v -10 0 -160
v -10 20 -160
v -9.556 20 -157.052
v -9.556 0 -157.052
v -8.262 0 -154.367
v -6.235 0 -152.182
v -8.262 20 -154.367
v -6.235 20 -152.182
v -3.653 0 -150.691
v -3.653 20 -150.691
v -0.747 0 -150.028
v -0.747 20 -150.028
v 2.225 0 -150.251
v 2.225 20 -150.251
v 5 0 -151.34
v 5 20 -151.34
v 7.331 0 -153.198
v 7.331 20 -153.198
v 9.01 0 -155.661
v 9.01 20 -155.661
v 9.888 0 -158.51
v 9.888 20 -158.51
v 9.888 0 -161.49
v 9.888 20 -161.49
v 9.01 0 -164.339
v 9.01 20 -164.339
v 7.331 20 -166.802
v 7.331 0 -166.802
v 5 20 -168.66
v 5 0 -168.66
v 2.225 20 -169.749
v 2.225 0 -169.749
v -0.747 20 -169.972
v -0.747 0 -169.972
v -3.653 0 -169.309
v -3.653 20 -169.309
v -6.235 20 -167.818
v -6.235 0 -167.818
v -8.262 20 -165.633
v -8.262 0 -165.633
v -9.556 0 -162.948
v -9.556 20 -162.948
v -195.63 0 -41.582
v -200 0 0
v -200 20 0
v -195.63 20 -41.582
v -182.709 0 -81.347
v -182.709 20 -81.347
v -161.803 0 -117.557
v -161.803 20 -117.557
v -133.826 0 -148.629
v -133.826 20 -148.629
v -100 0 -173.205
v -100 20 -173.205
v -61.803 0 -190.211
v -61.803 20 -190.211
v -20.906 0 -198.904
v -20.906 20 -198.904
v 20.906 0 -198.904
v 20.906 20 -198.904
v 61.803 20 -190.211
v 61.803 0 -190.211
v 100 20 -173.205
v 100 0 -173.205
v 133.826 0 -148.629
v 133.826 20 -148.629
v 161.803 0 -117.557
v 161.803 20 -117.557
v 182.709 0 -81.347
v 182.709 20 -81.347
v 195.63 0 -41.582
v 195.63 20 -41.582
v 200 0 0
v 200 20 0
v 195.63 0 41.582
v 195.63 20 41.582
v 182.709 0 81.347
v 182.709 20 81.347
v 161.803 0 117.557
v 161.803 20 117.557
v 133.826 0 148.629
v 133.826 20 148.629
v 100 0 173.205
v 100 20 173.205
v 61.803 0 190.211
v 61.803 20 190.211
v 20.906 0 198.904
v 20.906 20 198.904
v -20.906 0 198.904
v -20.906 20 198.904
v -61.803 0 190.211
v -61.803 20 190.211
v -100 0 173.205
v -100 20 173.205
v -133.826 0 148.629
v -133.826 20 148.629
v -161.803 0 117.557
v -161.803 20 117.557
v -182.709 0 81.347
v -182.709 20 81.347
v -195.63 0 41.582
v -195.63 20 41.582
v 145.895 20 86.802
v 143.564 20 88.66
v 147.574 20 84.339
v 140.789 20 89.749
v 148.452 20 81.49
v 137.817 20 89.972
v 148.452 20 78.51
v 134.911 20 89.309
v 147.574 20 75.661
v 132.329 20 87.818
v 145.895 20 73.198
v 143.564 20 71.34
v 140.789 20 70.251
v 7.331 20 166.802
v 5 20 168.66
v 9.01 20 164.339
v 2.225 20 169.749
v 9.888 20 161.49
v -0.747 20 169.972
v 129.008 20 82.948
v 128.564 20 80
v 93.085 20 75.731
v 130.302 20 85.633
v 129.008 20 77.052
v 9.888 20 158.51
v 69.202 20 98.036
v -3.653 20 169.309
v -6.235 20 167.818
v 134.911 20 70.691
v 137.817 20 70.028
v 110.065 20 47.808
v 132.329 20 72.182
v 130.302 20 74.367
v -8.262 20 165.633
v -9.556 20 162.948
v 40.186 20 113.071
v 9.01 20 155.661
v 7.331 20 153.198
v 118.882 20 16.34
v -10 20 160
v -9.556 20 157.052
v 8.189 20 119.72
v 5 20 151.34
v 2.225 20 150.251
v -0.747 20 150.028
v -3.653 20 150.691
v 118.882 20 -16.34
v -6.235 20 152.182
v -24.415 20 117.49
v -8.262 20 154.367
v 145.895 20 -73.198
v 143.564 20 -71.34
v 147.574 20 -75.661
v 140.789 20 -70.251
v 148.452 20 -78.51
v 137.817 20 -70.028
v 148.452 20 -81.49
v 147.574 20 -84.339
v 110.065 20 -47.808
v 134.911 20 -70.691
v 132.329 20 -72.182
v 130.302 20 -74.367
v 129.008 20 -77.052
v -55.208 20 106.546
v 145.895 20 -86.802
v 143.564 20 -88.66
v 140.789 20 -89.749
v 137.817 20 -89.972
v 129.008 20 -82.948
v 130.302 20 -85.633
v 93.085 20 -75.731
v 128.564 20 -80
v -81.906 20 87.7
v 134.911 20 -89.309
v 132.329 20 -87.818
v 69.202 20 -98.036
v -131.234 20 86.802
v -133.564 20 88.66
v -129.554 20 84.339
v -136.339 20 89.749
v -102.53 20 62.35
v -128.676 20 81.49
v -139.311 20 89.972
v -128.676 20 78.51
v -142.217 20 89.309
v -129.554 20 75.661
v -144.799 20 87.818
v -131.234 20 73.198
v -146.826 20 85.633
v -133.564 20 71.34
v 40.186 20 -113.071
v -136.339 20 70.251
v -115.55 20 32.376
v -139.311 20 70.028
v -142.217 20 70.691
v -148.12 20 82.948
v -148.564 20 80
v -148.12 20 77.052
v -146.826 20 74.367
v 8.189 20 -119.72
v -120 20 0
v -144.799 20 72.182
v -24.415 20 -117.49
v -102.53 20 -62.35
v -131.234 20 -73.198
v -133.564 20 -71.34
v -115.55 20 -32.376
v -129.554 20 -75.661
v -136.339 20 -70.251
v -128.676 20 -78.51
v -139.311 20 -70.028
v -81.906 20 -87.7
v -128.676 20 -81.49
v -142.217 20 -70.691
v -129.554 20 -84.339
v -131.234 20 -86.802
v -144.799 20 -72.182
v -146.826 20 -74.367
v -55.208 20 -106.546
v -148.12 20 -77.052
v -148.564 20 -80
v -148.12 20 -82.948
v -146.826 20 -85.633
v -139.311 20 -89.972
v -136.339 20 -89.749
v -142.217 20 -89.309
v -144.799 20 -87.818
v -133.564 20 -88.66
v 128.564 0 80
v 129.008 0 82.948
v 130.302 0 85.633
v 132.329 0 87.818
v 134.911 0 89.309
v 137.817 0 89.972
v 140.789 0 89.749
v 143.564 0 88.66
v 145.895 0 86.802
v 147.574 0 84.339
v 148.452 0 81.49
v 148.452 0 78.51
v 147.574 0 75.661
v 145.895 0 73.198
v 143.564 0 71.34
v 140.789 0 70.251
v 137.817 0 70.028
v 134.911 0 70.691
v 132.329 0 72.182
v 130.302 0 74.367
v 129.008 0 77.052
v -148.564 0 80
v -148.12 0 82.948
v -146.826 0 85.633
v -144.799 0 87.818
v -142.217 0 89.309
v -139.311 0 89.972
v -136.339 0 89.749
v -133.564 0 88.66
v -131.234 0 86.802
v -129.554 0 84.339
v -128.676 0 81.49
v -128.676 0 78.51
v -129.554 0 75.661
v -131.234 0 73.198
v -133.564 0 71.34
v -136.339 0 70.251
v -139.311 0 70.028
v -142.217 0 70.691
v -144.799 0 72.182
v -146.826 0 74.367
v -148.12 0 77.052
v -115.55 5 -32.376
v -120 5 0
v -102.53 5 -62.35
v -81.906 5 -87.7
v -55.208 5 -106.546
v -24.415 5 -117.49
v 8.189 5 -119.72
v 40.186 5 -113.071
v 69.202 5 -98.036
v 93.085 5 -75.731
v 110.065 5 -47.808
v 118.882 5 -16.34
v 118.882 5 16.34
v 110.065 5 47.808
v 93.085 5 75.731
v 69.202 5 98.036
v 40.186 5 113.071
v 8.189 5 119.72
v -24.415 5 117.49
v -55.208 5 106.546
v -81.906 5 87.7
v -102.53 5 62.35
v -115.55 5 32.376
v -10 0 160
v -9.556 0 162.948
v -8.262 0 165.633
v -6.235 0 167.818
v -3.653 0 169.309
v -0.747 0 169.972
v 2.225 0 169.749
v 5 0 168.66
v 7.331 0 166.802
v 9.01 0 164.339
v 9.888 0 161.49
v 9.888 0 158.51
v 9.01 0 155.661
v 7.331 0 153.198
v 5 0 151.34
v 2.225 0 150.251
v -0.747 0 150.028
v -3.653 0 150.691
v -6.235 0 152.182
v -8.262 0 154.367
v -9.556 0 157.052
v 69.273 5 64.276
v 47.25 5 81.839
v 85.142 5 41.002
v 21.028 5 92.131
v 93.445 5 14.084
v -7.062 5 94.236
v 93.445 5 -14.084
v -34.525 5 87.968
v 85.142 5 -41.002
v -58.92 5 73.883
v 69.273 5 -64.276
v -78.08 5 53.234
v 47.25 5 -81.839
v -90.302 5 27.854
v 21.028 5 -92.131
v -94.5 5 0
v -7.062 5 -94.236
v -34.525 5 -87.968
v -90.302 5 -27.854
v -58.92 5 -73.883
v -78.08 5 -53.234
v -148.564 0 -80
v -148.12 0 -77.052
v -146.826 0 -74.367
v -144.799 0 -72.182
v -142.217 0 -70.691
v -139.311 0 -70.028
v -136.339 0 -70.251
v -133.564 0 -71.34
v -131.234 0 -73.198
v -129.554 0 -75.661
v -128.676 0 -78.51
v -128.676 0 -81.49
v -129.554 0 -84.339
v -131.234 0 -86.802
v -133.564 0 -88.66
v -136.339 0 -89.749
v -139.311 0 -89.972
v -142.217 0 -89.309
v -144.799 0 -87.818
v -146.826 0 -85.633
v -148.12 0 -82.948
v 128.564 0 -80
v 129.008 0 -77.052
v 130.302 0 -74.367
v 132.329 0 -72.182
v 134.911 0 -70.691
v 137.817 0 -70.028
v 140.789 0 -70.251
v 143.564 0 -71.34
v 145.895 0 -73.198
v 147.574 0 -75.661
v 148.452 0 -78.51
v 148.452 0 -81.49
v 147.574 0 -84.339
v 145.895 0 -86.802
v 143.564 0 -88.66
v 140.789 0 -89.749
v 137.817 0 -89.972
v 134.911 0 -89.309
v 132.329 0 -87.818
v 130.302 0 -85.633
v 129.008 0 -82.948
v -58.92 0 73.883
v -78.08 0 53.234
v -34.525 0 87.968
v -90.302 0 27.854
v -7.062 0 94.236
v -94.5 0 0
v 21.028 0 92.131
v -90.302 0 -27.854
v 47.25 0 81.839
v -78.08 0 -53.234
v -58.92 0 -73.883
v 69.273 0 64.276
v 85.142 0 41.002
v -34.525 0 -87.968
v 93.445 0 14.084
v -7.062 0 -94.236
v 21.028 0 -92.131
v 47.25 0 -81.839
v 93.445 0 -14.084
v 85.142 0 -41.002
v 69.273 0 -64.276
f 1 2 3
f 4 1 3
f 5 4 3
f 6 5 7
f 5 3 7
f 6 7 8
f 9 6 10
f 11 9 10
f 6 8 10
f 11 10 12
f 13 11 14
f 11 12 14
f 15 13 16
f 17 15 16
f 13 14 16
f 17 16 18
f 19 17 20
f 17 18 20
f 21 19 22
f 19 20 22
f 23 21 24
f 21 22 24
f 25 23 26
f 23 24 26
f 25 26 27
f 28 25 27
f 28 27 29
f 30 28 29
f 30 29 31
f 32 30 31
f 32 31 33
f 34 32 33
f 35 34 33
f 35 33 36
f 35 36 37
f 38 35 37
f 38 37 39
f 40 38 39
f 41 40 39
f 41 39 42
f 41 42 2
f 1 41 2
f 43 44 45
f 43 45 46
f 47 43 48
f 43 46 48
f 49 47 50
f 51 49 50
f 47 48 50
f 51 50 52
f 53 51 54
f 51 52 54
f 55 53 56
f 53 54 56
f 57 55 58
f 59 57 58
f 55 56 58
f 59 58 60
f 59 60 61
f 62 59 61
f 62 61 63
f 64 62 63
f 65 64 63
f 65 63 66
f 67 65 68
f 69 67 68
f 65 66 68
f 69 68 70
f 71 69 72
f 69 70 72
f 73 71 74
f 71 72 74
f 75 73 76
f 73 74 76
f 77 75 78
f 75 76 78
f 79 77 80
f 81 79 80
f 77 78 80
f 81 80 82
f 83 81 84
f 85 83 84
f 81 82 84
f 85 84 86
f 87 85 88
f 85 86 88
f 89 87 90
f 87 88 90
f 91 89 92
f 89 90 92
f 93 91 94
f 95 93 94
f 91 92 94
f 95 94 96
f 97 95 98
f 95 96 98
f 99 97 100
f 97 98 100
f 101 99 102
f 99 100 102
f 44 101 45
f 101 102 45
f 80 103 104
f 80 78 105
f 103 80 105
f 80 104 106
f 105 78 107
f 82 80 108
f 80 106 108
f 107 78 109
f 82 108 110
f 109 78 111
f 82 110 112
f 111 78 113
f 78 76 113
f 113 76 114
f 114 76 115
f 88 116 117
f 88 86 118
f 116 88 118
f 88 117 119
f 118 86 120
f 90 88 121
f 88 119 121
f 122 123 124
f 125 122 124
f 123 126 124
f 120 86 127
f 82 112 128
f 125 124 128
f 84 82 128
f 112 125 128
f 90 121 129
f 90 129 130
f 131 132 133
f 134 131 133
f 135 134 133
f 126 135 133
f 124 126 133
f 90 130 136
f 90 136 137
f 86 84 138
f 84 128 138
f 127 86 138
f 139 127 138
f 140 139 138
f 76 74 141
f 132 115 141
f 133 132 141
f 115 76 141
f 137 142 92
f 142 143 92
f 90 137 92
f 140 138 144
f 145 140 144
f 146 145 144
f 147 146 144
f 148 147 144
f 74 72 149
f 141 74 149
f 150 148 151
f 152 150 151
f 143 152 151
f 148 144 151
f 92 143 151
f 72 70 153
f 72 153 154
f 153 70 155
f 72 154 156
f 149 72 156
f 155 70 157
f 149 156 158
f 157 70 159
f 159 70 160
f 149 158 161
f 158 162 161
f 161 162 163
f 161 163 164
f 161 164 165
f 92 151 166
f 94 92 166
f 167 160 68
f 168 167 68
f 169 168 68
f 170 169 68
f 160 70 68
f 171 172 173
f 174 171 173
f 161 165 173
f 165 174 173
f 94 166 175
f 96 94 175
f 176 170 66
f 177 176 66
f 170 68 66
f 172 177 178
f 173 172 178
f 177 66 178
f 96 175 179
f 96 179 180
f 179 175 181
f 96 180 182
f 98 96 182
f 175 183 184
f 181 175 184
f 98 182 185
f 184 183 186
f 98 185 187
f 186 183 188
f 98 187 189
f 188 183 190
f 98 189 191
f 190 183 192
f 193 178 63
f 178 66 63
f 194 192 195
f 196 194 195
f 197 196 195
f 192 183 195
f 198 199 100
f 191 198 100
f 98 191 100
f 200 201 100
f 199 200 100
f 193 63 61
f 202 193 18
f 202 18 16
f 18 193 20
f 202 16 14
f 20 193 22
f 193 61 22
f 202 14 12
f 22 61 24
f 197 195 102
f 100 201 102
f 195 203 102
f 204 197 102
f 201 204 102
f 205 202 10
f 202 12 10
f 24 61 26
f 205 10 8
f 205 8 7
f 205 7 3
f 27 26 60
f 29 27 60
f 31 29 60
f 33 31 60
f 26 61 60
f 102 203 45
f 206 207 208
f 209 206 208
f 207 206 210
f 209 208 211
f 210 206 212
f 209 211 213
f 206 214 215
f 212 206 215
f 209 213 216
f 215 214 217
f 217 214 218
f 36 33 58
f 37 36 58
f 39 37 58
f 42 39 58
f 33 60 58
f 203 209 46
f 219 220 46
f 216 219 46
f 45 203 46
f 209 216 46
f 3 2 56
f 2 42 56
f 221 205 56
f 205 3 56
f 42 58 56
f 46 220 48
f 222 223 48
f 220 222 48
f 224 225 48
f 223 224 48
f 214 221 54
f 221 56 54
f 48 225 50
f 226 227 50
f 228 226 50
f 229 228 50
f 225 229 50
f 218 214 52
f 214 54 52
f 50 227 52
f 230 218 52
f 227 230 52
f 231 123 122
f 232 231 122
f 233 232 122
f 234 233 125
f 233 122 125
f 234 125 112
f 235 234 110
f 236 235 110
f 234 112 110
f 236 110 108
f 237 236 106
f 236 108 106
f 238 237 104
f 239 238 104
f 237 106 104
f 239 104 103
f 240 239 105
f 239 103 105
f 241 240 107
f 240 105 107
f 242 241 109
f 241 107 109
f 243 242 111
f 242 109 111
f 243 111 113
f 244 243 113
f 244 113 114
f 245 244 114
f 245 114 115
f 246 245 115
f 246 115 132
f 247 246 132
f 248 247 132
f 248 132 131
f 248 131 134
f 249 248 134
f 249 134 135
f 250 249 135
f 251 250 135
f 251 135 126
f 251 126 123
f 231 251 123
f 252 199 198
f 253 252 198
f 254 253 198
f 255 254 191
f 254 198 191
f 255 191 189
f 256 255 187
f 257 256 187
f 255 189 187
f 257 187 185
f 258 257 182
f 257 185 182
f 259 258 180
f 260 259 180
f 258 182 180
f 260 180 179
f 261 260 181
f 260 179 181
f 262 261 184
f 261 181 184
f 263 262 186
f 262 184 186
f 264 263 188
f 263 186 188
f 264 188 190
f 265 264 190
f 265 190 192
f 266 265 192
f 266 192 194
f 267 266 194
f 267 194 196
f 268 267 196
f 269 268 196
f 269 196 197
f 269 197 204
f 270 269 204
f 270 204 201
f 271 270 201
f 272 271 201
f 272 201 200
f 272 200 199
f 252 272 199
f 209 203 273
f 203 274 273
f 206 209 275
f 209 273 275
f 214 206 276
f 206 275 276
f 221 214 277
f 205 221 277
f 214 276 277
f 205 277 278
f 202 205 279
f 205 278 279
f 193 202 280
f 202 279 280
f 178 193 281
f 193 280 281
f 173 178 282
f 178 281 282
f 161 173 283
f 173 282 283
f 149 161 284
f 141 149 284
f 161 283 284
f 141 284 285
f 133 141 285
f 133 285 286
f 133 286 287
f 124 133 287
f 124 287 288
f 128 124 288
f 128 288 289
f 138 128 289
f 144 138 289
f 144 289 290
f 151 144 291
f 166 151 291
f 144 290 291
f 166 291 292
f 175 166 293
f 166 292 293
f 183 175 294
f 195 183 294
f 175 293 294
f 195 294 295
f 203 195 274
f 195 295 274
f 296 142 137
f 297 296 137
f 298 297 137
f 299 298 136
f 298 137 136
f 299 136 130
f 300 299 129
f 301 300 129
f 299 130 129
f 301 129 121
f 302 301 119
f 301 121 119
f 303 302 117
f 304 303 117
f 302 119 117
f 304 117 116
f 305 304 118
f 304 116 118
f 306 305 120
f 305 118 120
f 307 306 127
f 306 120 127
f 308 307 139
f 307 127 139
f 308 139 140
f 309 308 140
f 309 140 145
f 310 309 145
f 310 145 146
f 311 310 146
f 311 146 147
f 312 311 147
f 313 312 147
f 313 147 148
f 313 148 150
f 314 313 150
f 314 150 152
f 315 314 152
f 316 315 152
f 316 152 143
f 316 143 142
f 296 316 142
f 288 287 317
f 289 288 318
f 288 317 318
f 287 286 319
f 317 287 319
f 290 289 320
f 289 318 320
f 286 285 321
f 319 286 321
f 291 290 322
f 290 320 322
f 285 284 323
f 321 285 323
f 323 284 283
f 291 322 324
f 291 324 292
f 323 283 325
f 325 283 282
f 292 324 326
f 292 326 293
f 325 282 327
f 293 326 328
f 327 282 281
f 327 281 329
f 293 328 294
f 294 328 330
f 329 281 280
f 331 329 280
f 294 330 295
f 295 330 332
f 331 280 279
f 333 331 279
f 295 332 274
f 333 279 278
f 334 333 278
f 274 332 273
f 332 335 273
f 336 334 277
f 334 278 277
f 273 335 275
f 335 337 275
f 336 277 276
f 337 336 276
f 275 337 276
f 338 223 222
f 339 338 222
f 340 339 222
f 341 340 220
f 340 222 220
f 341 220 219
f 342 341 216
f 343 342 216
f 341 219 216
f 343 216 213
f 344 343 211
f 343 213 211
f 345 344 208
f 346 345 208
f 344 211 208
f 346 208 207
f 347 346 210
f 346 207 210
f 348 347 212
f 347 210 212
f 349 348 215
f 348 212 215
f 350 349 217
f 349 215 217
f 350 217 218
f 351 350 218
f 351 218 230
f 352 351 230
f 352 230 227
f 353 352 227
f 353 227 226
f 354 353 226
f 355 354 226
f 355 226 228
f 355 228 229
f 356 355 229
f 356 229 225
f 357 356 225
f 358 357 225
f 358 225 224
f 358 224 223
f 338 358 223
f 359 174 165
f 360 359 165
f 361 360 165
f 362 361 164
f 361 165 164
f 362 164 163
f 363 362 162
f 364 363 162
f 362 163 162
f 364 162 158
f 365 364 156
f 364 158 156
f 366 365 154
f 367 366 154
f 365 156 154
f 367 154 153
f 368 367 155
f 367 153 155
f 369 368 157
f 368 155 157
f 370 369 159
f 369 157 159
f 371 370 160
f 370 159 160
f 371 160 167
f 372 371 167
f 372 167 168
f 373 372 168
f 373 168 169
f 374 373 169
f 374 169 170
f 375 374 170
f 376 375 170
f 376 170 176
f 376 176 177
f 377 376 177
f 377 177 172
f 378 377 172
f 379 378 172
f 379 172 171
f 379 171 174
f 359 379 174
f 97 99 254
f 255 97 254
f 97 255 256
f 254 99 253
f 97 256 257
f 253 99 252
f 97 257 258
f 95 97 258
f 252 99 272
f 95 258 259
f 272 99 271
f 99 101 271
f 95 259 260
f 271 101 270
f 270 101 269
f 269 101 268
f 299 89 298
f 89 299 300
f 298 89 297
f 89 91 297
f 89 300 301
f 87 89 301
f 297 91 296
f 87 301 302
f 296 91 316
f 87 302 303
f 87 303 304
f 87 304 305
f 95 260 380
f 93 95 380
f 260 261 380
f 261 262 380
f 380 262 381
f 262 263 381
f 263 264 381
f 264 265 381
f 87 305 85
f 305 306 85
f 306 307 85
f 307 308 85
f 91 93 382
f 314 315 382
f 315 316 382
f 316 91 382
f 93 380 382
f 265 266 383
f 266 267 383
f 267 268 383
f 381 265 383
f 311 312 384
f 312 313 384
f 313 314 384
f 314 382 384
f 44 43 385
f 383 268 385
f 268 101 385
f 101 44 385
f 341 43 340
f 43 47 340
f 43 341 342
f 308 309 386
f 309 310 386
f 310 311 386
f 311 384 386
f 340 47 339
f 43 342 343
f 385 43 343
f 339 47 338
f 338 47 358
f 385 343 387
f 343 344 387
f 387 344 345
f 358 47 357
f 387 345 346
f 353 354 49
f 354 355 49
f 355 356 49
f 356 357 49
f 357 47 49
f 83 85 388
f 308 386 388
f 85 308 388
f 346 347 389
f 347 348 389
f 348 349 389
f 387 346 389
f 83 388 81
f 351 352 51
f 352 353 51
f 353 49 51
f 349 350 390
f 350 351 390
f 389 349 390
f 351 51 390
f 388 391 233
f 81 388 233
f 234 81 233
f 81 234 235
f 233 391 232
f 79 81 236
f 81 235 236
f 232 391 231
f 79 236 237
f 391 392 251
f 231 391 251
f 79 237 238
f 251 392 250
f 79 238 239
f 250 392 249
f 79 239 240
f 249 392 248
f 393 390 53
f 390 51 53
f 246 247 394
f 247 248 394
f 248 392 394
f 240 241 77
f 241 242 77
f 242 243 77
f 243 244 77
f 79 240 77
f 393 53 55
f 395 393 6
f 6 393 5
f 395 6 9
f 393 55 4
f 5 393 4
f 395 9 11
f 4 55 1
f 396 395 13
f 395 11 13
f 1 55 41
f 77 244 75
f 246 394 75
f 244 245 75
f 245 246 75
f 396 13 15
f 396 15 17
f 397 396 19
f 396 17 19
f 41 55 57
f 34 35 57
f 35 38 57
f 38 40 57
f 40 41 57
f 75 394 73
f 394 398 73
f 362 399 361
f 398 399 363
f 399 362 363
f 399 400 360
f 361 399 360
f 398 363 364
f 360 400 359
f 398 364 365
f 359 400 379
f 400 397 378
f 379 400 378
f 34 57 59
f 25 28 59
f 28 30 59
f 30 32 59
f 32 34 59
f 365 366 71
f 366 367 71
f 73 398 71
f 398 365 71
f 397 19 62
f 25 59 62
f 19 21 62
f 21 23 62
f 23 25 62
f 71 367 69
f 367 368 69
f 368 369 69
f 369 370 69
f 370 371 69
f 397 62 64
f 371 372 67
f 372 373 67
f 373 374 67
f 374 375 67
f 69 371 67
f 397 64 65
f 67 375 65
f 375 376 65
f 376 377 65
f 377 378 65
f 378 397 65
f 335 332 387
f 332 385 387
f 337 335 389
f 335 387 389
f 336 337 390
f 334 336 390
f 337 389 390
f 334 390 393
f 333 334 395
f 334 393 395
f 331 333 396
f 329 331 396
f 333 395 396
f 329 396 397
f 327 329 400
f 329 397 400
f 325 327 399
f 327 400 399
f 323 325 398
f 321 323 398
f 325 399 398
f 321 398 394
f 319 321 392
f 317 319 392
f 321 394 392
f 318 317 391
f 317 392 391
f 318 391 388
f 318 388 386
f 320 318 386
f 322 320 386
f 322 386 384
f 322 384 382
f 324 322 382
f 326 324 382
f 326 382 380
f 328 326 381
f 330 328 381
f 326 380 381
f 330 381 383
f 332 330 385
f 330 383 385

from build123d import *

# Parameters (mm, degrees)
CUT_EXTRUDE_1_REACH = 285.549
SKETCH_5_R          = 10


with BuildPart() as part:
    # 草圖4 → 旋轉1 (revolve)
    with BuildSketch(Plane.XY, mode=Mode.PRIVATE) as revolve_1_sk:
        Polygon((120, 20), (120, 5), (94.5, 5), (94.5, 0), (200, 0), (200, 20), align=None)
    revolve(revolve_1_sk.sketch.rotate(Axis((0, 45.980375907, 0), (0, -1, 0)), 180), axis=Axis((0, 45.980375907, 0), (0, -1, 0)))

    # 草圖5 → 除料-伸長1 (cut, up to next)
    with BuildSketch(Plane(origin=(0, 20, 0), x_dir=(1, 0, 0), z_dir=(0, 1, 0)), mode=Mode.PRIVATE) as cut_extrude_1_sk1:
        with Locations(Location((0, 160, 0), (0, 0, 180))):
            Circle(SKETCH_5_R)
    cut_extrude_1_tool1 = extrude(cut_extrude_1_sk1.sketch, amount=-CUT_EXTRUDE_1_REACH, mode=Mode.PRIVATE) & part.part
    # 草圖5 → 除料-伸長1 (cut, up to next)
    with BuildSketch(Plane(origin=(0, 20, 0), x_dir=(1, 0, 0), z_dir=(0, 1, 0)), mode=Mode.PRIVATE) as cut_extrude_1_sk2:
        with Locations(Location((138.564064606, 80, 0), (0, 0, 180))):
            Circle(SKETCH_5_R)
    cut_extrude_1_tool2 = extrude(cut_extrude_1_sk2.sketch, amount=-CUT_EXTRUDE_1_REACH, mode=Mode.PRIVATE) & part.part
    # 草圖5 → 除料-伸長1 (cut, up to next)
    with BuildSketch(Plane(origin=(0, 20, 0), x_dir=(1, 0, 0), z_dir=(0, 1, 0)), mode=Mode.PRIVATE) as cut_extrude_1_sk3:
        with Locations(Location((138.564064606, -80, 0), (0, 0, 180))):
            Circle(SKETCH_5_R)
    cut_extrude_1_tool3 = extrude(cut_extrude_1_sk3.sketch, amount=-CUT_EXTRUDE_1_REACH, mode=Mode.PRIVATE) & part.part
    # 草圖5 → 除料-伸長1 (cut, up to next)
    with BuildSketch(Plane(origin=(0, 20, 0), x_dir=(1, 0, 0), z_dir=(0, 1, 0)), mode=Mode.PRIVATE) as cut_extrude_1_sk4:
        with Locations(Location((0, -160, 0), (0, 0, 180))):
            Circle(SKETCH_5_R)
    cut_extrude_1_tool4 = extrude(cut_extrude_1_sk4.sketch, amount=-CUT_EXTRUDE_1_REACH, mode=Mode.PRIVATE) & part.part
    # 草圖5 → 除料-伸長1 (cut, up to next)
    with BuildSketch(Plane(origin=(0, 20, 0), x_dir=(1, 0, 0), z_dir=(0, 1, 0)), mode=Mode.PRIVATE) as cut_extrude_1_sk5:
        with Locations(Location((-138.564064605, -80, 0), (0, 0, 180))):
            Circle(SKETCH_5_R)
    cut_extrude_1_tool5 = extrude(cut_extrude_1_sk5.sketch, amount=-CUT_EXTRUDE_1_REACH, mode=Mode.PRIVATE) & part.part
    # 草圖5 → 除料-伸長1 (cut, up to next)
    with BuildSketch(Plane(origin=(0, 20, 0), x_dir=(1, 0, 0), z_dir=(0, 1, 0)), mode=Mode.PRIVATE) as cut_extrude_1_sk6:
        with Locations(Location((-138.564064606, 80, 0), (0, 0, 180))):
            Circle(SKETCH_5_R)
    cut_extrude_1_tool6 = extrude(cut_extrude_1_sk6.sketch, amount=-CUT_EXTRUDE_1_REACH, mode=Mode.PRIVATE) & part.part
    add(cut_extrude_1_tool1.solids().sort_by_distance((0, 20, -160))[0], mode=Mode.SUBTRACT)
    add(cut_extrude_1_tool2.solids().sort_by_distance((138.564065, 20, -80))[0], mode=Mode.SUBTRACT)
    add(cut_extrude_1_tool3.solids().sort_by_distance((138.564065, 20, 80))[0], mode=Mode.SUBTRACT)
    add(cut_extrude_1_tool4.solids().sort_by_distance((0, 20, 160))[0], mode=Mode.SUBTRACT)
    add(cut_extrude_1_tool5.solids().sort_by_distance((-138.564065, 20, 80))[0], mode=Mode.SUBTRACT)
    add(cut_extrude_1_tool6.solids().sort_by_distance((-138.564065, 20, -80))[0], mode=Mode.SUBTRACT)


solid = part.part
